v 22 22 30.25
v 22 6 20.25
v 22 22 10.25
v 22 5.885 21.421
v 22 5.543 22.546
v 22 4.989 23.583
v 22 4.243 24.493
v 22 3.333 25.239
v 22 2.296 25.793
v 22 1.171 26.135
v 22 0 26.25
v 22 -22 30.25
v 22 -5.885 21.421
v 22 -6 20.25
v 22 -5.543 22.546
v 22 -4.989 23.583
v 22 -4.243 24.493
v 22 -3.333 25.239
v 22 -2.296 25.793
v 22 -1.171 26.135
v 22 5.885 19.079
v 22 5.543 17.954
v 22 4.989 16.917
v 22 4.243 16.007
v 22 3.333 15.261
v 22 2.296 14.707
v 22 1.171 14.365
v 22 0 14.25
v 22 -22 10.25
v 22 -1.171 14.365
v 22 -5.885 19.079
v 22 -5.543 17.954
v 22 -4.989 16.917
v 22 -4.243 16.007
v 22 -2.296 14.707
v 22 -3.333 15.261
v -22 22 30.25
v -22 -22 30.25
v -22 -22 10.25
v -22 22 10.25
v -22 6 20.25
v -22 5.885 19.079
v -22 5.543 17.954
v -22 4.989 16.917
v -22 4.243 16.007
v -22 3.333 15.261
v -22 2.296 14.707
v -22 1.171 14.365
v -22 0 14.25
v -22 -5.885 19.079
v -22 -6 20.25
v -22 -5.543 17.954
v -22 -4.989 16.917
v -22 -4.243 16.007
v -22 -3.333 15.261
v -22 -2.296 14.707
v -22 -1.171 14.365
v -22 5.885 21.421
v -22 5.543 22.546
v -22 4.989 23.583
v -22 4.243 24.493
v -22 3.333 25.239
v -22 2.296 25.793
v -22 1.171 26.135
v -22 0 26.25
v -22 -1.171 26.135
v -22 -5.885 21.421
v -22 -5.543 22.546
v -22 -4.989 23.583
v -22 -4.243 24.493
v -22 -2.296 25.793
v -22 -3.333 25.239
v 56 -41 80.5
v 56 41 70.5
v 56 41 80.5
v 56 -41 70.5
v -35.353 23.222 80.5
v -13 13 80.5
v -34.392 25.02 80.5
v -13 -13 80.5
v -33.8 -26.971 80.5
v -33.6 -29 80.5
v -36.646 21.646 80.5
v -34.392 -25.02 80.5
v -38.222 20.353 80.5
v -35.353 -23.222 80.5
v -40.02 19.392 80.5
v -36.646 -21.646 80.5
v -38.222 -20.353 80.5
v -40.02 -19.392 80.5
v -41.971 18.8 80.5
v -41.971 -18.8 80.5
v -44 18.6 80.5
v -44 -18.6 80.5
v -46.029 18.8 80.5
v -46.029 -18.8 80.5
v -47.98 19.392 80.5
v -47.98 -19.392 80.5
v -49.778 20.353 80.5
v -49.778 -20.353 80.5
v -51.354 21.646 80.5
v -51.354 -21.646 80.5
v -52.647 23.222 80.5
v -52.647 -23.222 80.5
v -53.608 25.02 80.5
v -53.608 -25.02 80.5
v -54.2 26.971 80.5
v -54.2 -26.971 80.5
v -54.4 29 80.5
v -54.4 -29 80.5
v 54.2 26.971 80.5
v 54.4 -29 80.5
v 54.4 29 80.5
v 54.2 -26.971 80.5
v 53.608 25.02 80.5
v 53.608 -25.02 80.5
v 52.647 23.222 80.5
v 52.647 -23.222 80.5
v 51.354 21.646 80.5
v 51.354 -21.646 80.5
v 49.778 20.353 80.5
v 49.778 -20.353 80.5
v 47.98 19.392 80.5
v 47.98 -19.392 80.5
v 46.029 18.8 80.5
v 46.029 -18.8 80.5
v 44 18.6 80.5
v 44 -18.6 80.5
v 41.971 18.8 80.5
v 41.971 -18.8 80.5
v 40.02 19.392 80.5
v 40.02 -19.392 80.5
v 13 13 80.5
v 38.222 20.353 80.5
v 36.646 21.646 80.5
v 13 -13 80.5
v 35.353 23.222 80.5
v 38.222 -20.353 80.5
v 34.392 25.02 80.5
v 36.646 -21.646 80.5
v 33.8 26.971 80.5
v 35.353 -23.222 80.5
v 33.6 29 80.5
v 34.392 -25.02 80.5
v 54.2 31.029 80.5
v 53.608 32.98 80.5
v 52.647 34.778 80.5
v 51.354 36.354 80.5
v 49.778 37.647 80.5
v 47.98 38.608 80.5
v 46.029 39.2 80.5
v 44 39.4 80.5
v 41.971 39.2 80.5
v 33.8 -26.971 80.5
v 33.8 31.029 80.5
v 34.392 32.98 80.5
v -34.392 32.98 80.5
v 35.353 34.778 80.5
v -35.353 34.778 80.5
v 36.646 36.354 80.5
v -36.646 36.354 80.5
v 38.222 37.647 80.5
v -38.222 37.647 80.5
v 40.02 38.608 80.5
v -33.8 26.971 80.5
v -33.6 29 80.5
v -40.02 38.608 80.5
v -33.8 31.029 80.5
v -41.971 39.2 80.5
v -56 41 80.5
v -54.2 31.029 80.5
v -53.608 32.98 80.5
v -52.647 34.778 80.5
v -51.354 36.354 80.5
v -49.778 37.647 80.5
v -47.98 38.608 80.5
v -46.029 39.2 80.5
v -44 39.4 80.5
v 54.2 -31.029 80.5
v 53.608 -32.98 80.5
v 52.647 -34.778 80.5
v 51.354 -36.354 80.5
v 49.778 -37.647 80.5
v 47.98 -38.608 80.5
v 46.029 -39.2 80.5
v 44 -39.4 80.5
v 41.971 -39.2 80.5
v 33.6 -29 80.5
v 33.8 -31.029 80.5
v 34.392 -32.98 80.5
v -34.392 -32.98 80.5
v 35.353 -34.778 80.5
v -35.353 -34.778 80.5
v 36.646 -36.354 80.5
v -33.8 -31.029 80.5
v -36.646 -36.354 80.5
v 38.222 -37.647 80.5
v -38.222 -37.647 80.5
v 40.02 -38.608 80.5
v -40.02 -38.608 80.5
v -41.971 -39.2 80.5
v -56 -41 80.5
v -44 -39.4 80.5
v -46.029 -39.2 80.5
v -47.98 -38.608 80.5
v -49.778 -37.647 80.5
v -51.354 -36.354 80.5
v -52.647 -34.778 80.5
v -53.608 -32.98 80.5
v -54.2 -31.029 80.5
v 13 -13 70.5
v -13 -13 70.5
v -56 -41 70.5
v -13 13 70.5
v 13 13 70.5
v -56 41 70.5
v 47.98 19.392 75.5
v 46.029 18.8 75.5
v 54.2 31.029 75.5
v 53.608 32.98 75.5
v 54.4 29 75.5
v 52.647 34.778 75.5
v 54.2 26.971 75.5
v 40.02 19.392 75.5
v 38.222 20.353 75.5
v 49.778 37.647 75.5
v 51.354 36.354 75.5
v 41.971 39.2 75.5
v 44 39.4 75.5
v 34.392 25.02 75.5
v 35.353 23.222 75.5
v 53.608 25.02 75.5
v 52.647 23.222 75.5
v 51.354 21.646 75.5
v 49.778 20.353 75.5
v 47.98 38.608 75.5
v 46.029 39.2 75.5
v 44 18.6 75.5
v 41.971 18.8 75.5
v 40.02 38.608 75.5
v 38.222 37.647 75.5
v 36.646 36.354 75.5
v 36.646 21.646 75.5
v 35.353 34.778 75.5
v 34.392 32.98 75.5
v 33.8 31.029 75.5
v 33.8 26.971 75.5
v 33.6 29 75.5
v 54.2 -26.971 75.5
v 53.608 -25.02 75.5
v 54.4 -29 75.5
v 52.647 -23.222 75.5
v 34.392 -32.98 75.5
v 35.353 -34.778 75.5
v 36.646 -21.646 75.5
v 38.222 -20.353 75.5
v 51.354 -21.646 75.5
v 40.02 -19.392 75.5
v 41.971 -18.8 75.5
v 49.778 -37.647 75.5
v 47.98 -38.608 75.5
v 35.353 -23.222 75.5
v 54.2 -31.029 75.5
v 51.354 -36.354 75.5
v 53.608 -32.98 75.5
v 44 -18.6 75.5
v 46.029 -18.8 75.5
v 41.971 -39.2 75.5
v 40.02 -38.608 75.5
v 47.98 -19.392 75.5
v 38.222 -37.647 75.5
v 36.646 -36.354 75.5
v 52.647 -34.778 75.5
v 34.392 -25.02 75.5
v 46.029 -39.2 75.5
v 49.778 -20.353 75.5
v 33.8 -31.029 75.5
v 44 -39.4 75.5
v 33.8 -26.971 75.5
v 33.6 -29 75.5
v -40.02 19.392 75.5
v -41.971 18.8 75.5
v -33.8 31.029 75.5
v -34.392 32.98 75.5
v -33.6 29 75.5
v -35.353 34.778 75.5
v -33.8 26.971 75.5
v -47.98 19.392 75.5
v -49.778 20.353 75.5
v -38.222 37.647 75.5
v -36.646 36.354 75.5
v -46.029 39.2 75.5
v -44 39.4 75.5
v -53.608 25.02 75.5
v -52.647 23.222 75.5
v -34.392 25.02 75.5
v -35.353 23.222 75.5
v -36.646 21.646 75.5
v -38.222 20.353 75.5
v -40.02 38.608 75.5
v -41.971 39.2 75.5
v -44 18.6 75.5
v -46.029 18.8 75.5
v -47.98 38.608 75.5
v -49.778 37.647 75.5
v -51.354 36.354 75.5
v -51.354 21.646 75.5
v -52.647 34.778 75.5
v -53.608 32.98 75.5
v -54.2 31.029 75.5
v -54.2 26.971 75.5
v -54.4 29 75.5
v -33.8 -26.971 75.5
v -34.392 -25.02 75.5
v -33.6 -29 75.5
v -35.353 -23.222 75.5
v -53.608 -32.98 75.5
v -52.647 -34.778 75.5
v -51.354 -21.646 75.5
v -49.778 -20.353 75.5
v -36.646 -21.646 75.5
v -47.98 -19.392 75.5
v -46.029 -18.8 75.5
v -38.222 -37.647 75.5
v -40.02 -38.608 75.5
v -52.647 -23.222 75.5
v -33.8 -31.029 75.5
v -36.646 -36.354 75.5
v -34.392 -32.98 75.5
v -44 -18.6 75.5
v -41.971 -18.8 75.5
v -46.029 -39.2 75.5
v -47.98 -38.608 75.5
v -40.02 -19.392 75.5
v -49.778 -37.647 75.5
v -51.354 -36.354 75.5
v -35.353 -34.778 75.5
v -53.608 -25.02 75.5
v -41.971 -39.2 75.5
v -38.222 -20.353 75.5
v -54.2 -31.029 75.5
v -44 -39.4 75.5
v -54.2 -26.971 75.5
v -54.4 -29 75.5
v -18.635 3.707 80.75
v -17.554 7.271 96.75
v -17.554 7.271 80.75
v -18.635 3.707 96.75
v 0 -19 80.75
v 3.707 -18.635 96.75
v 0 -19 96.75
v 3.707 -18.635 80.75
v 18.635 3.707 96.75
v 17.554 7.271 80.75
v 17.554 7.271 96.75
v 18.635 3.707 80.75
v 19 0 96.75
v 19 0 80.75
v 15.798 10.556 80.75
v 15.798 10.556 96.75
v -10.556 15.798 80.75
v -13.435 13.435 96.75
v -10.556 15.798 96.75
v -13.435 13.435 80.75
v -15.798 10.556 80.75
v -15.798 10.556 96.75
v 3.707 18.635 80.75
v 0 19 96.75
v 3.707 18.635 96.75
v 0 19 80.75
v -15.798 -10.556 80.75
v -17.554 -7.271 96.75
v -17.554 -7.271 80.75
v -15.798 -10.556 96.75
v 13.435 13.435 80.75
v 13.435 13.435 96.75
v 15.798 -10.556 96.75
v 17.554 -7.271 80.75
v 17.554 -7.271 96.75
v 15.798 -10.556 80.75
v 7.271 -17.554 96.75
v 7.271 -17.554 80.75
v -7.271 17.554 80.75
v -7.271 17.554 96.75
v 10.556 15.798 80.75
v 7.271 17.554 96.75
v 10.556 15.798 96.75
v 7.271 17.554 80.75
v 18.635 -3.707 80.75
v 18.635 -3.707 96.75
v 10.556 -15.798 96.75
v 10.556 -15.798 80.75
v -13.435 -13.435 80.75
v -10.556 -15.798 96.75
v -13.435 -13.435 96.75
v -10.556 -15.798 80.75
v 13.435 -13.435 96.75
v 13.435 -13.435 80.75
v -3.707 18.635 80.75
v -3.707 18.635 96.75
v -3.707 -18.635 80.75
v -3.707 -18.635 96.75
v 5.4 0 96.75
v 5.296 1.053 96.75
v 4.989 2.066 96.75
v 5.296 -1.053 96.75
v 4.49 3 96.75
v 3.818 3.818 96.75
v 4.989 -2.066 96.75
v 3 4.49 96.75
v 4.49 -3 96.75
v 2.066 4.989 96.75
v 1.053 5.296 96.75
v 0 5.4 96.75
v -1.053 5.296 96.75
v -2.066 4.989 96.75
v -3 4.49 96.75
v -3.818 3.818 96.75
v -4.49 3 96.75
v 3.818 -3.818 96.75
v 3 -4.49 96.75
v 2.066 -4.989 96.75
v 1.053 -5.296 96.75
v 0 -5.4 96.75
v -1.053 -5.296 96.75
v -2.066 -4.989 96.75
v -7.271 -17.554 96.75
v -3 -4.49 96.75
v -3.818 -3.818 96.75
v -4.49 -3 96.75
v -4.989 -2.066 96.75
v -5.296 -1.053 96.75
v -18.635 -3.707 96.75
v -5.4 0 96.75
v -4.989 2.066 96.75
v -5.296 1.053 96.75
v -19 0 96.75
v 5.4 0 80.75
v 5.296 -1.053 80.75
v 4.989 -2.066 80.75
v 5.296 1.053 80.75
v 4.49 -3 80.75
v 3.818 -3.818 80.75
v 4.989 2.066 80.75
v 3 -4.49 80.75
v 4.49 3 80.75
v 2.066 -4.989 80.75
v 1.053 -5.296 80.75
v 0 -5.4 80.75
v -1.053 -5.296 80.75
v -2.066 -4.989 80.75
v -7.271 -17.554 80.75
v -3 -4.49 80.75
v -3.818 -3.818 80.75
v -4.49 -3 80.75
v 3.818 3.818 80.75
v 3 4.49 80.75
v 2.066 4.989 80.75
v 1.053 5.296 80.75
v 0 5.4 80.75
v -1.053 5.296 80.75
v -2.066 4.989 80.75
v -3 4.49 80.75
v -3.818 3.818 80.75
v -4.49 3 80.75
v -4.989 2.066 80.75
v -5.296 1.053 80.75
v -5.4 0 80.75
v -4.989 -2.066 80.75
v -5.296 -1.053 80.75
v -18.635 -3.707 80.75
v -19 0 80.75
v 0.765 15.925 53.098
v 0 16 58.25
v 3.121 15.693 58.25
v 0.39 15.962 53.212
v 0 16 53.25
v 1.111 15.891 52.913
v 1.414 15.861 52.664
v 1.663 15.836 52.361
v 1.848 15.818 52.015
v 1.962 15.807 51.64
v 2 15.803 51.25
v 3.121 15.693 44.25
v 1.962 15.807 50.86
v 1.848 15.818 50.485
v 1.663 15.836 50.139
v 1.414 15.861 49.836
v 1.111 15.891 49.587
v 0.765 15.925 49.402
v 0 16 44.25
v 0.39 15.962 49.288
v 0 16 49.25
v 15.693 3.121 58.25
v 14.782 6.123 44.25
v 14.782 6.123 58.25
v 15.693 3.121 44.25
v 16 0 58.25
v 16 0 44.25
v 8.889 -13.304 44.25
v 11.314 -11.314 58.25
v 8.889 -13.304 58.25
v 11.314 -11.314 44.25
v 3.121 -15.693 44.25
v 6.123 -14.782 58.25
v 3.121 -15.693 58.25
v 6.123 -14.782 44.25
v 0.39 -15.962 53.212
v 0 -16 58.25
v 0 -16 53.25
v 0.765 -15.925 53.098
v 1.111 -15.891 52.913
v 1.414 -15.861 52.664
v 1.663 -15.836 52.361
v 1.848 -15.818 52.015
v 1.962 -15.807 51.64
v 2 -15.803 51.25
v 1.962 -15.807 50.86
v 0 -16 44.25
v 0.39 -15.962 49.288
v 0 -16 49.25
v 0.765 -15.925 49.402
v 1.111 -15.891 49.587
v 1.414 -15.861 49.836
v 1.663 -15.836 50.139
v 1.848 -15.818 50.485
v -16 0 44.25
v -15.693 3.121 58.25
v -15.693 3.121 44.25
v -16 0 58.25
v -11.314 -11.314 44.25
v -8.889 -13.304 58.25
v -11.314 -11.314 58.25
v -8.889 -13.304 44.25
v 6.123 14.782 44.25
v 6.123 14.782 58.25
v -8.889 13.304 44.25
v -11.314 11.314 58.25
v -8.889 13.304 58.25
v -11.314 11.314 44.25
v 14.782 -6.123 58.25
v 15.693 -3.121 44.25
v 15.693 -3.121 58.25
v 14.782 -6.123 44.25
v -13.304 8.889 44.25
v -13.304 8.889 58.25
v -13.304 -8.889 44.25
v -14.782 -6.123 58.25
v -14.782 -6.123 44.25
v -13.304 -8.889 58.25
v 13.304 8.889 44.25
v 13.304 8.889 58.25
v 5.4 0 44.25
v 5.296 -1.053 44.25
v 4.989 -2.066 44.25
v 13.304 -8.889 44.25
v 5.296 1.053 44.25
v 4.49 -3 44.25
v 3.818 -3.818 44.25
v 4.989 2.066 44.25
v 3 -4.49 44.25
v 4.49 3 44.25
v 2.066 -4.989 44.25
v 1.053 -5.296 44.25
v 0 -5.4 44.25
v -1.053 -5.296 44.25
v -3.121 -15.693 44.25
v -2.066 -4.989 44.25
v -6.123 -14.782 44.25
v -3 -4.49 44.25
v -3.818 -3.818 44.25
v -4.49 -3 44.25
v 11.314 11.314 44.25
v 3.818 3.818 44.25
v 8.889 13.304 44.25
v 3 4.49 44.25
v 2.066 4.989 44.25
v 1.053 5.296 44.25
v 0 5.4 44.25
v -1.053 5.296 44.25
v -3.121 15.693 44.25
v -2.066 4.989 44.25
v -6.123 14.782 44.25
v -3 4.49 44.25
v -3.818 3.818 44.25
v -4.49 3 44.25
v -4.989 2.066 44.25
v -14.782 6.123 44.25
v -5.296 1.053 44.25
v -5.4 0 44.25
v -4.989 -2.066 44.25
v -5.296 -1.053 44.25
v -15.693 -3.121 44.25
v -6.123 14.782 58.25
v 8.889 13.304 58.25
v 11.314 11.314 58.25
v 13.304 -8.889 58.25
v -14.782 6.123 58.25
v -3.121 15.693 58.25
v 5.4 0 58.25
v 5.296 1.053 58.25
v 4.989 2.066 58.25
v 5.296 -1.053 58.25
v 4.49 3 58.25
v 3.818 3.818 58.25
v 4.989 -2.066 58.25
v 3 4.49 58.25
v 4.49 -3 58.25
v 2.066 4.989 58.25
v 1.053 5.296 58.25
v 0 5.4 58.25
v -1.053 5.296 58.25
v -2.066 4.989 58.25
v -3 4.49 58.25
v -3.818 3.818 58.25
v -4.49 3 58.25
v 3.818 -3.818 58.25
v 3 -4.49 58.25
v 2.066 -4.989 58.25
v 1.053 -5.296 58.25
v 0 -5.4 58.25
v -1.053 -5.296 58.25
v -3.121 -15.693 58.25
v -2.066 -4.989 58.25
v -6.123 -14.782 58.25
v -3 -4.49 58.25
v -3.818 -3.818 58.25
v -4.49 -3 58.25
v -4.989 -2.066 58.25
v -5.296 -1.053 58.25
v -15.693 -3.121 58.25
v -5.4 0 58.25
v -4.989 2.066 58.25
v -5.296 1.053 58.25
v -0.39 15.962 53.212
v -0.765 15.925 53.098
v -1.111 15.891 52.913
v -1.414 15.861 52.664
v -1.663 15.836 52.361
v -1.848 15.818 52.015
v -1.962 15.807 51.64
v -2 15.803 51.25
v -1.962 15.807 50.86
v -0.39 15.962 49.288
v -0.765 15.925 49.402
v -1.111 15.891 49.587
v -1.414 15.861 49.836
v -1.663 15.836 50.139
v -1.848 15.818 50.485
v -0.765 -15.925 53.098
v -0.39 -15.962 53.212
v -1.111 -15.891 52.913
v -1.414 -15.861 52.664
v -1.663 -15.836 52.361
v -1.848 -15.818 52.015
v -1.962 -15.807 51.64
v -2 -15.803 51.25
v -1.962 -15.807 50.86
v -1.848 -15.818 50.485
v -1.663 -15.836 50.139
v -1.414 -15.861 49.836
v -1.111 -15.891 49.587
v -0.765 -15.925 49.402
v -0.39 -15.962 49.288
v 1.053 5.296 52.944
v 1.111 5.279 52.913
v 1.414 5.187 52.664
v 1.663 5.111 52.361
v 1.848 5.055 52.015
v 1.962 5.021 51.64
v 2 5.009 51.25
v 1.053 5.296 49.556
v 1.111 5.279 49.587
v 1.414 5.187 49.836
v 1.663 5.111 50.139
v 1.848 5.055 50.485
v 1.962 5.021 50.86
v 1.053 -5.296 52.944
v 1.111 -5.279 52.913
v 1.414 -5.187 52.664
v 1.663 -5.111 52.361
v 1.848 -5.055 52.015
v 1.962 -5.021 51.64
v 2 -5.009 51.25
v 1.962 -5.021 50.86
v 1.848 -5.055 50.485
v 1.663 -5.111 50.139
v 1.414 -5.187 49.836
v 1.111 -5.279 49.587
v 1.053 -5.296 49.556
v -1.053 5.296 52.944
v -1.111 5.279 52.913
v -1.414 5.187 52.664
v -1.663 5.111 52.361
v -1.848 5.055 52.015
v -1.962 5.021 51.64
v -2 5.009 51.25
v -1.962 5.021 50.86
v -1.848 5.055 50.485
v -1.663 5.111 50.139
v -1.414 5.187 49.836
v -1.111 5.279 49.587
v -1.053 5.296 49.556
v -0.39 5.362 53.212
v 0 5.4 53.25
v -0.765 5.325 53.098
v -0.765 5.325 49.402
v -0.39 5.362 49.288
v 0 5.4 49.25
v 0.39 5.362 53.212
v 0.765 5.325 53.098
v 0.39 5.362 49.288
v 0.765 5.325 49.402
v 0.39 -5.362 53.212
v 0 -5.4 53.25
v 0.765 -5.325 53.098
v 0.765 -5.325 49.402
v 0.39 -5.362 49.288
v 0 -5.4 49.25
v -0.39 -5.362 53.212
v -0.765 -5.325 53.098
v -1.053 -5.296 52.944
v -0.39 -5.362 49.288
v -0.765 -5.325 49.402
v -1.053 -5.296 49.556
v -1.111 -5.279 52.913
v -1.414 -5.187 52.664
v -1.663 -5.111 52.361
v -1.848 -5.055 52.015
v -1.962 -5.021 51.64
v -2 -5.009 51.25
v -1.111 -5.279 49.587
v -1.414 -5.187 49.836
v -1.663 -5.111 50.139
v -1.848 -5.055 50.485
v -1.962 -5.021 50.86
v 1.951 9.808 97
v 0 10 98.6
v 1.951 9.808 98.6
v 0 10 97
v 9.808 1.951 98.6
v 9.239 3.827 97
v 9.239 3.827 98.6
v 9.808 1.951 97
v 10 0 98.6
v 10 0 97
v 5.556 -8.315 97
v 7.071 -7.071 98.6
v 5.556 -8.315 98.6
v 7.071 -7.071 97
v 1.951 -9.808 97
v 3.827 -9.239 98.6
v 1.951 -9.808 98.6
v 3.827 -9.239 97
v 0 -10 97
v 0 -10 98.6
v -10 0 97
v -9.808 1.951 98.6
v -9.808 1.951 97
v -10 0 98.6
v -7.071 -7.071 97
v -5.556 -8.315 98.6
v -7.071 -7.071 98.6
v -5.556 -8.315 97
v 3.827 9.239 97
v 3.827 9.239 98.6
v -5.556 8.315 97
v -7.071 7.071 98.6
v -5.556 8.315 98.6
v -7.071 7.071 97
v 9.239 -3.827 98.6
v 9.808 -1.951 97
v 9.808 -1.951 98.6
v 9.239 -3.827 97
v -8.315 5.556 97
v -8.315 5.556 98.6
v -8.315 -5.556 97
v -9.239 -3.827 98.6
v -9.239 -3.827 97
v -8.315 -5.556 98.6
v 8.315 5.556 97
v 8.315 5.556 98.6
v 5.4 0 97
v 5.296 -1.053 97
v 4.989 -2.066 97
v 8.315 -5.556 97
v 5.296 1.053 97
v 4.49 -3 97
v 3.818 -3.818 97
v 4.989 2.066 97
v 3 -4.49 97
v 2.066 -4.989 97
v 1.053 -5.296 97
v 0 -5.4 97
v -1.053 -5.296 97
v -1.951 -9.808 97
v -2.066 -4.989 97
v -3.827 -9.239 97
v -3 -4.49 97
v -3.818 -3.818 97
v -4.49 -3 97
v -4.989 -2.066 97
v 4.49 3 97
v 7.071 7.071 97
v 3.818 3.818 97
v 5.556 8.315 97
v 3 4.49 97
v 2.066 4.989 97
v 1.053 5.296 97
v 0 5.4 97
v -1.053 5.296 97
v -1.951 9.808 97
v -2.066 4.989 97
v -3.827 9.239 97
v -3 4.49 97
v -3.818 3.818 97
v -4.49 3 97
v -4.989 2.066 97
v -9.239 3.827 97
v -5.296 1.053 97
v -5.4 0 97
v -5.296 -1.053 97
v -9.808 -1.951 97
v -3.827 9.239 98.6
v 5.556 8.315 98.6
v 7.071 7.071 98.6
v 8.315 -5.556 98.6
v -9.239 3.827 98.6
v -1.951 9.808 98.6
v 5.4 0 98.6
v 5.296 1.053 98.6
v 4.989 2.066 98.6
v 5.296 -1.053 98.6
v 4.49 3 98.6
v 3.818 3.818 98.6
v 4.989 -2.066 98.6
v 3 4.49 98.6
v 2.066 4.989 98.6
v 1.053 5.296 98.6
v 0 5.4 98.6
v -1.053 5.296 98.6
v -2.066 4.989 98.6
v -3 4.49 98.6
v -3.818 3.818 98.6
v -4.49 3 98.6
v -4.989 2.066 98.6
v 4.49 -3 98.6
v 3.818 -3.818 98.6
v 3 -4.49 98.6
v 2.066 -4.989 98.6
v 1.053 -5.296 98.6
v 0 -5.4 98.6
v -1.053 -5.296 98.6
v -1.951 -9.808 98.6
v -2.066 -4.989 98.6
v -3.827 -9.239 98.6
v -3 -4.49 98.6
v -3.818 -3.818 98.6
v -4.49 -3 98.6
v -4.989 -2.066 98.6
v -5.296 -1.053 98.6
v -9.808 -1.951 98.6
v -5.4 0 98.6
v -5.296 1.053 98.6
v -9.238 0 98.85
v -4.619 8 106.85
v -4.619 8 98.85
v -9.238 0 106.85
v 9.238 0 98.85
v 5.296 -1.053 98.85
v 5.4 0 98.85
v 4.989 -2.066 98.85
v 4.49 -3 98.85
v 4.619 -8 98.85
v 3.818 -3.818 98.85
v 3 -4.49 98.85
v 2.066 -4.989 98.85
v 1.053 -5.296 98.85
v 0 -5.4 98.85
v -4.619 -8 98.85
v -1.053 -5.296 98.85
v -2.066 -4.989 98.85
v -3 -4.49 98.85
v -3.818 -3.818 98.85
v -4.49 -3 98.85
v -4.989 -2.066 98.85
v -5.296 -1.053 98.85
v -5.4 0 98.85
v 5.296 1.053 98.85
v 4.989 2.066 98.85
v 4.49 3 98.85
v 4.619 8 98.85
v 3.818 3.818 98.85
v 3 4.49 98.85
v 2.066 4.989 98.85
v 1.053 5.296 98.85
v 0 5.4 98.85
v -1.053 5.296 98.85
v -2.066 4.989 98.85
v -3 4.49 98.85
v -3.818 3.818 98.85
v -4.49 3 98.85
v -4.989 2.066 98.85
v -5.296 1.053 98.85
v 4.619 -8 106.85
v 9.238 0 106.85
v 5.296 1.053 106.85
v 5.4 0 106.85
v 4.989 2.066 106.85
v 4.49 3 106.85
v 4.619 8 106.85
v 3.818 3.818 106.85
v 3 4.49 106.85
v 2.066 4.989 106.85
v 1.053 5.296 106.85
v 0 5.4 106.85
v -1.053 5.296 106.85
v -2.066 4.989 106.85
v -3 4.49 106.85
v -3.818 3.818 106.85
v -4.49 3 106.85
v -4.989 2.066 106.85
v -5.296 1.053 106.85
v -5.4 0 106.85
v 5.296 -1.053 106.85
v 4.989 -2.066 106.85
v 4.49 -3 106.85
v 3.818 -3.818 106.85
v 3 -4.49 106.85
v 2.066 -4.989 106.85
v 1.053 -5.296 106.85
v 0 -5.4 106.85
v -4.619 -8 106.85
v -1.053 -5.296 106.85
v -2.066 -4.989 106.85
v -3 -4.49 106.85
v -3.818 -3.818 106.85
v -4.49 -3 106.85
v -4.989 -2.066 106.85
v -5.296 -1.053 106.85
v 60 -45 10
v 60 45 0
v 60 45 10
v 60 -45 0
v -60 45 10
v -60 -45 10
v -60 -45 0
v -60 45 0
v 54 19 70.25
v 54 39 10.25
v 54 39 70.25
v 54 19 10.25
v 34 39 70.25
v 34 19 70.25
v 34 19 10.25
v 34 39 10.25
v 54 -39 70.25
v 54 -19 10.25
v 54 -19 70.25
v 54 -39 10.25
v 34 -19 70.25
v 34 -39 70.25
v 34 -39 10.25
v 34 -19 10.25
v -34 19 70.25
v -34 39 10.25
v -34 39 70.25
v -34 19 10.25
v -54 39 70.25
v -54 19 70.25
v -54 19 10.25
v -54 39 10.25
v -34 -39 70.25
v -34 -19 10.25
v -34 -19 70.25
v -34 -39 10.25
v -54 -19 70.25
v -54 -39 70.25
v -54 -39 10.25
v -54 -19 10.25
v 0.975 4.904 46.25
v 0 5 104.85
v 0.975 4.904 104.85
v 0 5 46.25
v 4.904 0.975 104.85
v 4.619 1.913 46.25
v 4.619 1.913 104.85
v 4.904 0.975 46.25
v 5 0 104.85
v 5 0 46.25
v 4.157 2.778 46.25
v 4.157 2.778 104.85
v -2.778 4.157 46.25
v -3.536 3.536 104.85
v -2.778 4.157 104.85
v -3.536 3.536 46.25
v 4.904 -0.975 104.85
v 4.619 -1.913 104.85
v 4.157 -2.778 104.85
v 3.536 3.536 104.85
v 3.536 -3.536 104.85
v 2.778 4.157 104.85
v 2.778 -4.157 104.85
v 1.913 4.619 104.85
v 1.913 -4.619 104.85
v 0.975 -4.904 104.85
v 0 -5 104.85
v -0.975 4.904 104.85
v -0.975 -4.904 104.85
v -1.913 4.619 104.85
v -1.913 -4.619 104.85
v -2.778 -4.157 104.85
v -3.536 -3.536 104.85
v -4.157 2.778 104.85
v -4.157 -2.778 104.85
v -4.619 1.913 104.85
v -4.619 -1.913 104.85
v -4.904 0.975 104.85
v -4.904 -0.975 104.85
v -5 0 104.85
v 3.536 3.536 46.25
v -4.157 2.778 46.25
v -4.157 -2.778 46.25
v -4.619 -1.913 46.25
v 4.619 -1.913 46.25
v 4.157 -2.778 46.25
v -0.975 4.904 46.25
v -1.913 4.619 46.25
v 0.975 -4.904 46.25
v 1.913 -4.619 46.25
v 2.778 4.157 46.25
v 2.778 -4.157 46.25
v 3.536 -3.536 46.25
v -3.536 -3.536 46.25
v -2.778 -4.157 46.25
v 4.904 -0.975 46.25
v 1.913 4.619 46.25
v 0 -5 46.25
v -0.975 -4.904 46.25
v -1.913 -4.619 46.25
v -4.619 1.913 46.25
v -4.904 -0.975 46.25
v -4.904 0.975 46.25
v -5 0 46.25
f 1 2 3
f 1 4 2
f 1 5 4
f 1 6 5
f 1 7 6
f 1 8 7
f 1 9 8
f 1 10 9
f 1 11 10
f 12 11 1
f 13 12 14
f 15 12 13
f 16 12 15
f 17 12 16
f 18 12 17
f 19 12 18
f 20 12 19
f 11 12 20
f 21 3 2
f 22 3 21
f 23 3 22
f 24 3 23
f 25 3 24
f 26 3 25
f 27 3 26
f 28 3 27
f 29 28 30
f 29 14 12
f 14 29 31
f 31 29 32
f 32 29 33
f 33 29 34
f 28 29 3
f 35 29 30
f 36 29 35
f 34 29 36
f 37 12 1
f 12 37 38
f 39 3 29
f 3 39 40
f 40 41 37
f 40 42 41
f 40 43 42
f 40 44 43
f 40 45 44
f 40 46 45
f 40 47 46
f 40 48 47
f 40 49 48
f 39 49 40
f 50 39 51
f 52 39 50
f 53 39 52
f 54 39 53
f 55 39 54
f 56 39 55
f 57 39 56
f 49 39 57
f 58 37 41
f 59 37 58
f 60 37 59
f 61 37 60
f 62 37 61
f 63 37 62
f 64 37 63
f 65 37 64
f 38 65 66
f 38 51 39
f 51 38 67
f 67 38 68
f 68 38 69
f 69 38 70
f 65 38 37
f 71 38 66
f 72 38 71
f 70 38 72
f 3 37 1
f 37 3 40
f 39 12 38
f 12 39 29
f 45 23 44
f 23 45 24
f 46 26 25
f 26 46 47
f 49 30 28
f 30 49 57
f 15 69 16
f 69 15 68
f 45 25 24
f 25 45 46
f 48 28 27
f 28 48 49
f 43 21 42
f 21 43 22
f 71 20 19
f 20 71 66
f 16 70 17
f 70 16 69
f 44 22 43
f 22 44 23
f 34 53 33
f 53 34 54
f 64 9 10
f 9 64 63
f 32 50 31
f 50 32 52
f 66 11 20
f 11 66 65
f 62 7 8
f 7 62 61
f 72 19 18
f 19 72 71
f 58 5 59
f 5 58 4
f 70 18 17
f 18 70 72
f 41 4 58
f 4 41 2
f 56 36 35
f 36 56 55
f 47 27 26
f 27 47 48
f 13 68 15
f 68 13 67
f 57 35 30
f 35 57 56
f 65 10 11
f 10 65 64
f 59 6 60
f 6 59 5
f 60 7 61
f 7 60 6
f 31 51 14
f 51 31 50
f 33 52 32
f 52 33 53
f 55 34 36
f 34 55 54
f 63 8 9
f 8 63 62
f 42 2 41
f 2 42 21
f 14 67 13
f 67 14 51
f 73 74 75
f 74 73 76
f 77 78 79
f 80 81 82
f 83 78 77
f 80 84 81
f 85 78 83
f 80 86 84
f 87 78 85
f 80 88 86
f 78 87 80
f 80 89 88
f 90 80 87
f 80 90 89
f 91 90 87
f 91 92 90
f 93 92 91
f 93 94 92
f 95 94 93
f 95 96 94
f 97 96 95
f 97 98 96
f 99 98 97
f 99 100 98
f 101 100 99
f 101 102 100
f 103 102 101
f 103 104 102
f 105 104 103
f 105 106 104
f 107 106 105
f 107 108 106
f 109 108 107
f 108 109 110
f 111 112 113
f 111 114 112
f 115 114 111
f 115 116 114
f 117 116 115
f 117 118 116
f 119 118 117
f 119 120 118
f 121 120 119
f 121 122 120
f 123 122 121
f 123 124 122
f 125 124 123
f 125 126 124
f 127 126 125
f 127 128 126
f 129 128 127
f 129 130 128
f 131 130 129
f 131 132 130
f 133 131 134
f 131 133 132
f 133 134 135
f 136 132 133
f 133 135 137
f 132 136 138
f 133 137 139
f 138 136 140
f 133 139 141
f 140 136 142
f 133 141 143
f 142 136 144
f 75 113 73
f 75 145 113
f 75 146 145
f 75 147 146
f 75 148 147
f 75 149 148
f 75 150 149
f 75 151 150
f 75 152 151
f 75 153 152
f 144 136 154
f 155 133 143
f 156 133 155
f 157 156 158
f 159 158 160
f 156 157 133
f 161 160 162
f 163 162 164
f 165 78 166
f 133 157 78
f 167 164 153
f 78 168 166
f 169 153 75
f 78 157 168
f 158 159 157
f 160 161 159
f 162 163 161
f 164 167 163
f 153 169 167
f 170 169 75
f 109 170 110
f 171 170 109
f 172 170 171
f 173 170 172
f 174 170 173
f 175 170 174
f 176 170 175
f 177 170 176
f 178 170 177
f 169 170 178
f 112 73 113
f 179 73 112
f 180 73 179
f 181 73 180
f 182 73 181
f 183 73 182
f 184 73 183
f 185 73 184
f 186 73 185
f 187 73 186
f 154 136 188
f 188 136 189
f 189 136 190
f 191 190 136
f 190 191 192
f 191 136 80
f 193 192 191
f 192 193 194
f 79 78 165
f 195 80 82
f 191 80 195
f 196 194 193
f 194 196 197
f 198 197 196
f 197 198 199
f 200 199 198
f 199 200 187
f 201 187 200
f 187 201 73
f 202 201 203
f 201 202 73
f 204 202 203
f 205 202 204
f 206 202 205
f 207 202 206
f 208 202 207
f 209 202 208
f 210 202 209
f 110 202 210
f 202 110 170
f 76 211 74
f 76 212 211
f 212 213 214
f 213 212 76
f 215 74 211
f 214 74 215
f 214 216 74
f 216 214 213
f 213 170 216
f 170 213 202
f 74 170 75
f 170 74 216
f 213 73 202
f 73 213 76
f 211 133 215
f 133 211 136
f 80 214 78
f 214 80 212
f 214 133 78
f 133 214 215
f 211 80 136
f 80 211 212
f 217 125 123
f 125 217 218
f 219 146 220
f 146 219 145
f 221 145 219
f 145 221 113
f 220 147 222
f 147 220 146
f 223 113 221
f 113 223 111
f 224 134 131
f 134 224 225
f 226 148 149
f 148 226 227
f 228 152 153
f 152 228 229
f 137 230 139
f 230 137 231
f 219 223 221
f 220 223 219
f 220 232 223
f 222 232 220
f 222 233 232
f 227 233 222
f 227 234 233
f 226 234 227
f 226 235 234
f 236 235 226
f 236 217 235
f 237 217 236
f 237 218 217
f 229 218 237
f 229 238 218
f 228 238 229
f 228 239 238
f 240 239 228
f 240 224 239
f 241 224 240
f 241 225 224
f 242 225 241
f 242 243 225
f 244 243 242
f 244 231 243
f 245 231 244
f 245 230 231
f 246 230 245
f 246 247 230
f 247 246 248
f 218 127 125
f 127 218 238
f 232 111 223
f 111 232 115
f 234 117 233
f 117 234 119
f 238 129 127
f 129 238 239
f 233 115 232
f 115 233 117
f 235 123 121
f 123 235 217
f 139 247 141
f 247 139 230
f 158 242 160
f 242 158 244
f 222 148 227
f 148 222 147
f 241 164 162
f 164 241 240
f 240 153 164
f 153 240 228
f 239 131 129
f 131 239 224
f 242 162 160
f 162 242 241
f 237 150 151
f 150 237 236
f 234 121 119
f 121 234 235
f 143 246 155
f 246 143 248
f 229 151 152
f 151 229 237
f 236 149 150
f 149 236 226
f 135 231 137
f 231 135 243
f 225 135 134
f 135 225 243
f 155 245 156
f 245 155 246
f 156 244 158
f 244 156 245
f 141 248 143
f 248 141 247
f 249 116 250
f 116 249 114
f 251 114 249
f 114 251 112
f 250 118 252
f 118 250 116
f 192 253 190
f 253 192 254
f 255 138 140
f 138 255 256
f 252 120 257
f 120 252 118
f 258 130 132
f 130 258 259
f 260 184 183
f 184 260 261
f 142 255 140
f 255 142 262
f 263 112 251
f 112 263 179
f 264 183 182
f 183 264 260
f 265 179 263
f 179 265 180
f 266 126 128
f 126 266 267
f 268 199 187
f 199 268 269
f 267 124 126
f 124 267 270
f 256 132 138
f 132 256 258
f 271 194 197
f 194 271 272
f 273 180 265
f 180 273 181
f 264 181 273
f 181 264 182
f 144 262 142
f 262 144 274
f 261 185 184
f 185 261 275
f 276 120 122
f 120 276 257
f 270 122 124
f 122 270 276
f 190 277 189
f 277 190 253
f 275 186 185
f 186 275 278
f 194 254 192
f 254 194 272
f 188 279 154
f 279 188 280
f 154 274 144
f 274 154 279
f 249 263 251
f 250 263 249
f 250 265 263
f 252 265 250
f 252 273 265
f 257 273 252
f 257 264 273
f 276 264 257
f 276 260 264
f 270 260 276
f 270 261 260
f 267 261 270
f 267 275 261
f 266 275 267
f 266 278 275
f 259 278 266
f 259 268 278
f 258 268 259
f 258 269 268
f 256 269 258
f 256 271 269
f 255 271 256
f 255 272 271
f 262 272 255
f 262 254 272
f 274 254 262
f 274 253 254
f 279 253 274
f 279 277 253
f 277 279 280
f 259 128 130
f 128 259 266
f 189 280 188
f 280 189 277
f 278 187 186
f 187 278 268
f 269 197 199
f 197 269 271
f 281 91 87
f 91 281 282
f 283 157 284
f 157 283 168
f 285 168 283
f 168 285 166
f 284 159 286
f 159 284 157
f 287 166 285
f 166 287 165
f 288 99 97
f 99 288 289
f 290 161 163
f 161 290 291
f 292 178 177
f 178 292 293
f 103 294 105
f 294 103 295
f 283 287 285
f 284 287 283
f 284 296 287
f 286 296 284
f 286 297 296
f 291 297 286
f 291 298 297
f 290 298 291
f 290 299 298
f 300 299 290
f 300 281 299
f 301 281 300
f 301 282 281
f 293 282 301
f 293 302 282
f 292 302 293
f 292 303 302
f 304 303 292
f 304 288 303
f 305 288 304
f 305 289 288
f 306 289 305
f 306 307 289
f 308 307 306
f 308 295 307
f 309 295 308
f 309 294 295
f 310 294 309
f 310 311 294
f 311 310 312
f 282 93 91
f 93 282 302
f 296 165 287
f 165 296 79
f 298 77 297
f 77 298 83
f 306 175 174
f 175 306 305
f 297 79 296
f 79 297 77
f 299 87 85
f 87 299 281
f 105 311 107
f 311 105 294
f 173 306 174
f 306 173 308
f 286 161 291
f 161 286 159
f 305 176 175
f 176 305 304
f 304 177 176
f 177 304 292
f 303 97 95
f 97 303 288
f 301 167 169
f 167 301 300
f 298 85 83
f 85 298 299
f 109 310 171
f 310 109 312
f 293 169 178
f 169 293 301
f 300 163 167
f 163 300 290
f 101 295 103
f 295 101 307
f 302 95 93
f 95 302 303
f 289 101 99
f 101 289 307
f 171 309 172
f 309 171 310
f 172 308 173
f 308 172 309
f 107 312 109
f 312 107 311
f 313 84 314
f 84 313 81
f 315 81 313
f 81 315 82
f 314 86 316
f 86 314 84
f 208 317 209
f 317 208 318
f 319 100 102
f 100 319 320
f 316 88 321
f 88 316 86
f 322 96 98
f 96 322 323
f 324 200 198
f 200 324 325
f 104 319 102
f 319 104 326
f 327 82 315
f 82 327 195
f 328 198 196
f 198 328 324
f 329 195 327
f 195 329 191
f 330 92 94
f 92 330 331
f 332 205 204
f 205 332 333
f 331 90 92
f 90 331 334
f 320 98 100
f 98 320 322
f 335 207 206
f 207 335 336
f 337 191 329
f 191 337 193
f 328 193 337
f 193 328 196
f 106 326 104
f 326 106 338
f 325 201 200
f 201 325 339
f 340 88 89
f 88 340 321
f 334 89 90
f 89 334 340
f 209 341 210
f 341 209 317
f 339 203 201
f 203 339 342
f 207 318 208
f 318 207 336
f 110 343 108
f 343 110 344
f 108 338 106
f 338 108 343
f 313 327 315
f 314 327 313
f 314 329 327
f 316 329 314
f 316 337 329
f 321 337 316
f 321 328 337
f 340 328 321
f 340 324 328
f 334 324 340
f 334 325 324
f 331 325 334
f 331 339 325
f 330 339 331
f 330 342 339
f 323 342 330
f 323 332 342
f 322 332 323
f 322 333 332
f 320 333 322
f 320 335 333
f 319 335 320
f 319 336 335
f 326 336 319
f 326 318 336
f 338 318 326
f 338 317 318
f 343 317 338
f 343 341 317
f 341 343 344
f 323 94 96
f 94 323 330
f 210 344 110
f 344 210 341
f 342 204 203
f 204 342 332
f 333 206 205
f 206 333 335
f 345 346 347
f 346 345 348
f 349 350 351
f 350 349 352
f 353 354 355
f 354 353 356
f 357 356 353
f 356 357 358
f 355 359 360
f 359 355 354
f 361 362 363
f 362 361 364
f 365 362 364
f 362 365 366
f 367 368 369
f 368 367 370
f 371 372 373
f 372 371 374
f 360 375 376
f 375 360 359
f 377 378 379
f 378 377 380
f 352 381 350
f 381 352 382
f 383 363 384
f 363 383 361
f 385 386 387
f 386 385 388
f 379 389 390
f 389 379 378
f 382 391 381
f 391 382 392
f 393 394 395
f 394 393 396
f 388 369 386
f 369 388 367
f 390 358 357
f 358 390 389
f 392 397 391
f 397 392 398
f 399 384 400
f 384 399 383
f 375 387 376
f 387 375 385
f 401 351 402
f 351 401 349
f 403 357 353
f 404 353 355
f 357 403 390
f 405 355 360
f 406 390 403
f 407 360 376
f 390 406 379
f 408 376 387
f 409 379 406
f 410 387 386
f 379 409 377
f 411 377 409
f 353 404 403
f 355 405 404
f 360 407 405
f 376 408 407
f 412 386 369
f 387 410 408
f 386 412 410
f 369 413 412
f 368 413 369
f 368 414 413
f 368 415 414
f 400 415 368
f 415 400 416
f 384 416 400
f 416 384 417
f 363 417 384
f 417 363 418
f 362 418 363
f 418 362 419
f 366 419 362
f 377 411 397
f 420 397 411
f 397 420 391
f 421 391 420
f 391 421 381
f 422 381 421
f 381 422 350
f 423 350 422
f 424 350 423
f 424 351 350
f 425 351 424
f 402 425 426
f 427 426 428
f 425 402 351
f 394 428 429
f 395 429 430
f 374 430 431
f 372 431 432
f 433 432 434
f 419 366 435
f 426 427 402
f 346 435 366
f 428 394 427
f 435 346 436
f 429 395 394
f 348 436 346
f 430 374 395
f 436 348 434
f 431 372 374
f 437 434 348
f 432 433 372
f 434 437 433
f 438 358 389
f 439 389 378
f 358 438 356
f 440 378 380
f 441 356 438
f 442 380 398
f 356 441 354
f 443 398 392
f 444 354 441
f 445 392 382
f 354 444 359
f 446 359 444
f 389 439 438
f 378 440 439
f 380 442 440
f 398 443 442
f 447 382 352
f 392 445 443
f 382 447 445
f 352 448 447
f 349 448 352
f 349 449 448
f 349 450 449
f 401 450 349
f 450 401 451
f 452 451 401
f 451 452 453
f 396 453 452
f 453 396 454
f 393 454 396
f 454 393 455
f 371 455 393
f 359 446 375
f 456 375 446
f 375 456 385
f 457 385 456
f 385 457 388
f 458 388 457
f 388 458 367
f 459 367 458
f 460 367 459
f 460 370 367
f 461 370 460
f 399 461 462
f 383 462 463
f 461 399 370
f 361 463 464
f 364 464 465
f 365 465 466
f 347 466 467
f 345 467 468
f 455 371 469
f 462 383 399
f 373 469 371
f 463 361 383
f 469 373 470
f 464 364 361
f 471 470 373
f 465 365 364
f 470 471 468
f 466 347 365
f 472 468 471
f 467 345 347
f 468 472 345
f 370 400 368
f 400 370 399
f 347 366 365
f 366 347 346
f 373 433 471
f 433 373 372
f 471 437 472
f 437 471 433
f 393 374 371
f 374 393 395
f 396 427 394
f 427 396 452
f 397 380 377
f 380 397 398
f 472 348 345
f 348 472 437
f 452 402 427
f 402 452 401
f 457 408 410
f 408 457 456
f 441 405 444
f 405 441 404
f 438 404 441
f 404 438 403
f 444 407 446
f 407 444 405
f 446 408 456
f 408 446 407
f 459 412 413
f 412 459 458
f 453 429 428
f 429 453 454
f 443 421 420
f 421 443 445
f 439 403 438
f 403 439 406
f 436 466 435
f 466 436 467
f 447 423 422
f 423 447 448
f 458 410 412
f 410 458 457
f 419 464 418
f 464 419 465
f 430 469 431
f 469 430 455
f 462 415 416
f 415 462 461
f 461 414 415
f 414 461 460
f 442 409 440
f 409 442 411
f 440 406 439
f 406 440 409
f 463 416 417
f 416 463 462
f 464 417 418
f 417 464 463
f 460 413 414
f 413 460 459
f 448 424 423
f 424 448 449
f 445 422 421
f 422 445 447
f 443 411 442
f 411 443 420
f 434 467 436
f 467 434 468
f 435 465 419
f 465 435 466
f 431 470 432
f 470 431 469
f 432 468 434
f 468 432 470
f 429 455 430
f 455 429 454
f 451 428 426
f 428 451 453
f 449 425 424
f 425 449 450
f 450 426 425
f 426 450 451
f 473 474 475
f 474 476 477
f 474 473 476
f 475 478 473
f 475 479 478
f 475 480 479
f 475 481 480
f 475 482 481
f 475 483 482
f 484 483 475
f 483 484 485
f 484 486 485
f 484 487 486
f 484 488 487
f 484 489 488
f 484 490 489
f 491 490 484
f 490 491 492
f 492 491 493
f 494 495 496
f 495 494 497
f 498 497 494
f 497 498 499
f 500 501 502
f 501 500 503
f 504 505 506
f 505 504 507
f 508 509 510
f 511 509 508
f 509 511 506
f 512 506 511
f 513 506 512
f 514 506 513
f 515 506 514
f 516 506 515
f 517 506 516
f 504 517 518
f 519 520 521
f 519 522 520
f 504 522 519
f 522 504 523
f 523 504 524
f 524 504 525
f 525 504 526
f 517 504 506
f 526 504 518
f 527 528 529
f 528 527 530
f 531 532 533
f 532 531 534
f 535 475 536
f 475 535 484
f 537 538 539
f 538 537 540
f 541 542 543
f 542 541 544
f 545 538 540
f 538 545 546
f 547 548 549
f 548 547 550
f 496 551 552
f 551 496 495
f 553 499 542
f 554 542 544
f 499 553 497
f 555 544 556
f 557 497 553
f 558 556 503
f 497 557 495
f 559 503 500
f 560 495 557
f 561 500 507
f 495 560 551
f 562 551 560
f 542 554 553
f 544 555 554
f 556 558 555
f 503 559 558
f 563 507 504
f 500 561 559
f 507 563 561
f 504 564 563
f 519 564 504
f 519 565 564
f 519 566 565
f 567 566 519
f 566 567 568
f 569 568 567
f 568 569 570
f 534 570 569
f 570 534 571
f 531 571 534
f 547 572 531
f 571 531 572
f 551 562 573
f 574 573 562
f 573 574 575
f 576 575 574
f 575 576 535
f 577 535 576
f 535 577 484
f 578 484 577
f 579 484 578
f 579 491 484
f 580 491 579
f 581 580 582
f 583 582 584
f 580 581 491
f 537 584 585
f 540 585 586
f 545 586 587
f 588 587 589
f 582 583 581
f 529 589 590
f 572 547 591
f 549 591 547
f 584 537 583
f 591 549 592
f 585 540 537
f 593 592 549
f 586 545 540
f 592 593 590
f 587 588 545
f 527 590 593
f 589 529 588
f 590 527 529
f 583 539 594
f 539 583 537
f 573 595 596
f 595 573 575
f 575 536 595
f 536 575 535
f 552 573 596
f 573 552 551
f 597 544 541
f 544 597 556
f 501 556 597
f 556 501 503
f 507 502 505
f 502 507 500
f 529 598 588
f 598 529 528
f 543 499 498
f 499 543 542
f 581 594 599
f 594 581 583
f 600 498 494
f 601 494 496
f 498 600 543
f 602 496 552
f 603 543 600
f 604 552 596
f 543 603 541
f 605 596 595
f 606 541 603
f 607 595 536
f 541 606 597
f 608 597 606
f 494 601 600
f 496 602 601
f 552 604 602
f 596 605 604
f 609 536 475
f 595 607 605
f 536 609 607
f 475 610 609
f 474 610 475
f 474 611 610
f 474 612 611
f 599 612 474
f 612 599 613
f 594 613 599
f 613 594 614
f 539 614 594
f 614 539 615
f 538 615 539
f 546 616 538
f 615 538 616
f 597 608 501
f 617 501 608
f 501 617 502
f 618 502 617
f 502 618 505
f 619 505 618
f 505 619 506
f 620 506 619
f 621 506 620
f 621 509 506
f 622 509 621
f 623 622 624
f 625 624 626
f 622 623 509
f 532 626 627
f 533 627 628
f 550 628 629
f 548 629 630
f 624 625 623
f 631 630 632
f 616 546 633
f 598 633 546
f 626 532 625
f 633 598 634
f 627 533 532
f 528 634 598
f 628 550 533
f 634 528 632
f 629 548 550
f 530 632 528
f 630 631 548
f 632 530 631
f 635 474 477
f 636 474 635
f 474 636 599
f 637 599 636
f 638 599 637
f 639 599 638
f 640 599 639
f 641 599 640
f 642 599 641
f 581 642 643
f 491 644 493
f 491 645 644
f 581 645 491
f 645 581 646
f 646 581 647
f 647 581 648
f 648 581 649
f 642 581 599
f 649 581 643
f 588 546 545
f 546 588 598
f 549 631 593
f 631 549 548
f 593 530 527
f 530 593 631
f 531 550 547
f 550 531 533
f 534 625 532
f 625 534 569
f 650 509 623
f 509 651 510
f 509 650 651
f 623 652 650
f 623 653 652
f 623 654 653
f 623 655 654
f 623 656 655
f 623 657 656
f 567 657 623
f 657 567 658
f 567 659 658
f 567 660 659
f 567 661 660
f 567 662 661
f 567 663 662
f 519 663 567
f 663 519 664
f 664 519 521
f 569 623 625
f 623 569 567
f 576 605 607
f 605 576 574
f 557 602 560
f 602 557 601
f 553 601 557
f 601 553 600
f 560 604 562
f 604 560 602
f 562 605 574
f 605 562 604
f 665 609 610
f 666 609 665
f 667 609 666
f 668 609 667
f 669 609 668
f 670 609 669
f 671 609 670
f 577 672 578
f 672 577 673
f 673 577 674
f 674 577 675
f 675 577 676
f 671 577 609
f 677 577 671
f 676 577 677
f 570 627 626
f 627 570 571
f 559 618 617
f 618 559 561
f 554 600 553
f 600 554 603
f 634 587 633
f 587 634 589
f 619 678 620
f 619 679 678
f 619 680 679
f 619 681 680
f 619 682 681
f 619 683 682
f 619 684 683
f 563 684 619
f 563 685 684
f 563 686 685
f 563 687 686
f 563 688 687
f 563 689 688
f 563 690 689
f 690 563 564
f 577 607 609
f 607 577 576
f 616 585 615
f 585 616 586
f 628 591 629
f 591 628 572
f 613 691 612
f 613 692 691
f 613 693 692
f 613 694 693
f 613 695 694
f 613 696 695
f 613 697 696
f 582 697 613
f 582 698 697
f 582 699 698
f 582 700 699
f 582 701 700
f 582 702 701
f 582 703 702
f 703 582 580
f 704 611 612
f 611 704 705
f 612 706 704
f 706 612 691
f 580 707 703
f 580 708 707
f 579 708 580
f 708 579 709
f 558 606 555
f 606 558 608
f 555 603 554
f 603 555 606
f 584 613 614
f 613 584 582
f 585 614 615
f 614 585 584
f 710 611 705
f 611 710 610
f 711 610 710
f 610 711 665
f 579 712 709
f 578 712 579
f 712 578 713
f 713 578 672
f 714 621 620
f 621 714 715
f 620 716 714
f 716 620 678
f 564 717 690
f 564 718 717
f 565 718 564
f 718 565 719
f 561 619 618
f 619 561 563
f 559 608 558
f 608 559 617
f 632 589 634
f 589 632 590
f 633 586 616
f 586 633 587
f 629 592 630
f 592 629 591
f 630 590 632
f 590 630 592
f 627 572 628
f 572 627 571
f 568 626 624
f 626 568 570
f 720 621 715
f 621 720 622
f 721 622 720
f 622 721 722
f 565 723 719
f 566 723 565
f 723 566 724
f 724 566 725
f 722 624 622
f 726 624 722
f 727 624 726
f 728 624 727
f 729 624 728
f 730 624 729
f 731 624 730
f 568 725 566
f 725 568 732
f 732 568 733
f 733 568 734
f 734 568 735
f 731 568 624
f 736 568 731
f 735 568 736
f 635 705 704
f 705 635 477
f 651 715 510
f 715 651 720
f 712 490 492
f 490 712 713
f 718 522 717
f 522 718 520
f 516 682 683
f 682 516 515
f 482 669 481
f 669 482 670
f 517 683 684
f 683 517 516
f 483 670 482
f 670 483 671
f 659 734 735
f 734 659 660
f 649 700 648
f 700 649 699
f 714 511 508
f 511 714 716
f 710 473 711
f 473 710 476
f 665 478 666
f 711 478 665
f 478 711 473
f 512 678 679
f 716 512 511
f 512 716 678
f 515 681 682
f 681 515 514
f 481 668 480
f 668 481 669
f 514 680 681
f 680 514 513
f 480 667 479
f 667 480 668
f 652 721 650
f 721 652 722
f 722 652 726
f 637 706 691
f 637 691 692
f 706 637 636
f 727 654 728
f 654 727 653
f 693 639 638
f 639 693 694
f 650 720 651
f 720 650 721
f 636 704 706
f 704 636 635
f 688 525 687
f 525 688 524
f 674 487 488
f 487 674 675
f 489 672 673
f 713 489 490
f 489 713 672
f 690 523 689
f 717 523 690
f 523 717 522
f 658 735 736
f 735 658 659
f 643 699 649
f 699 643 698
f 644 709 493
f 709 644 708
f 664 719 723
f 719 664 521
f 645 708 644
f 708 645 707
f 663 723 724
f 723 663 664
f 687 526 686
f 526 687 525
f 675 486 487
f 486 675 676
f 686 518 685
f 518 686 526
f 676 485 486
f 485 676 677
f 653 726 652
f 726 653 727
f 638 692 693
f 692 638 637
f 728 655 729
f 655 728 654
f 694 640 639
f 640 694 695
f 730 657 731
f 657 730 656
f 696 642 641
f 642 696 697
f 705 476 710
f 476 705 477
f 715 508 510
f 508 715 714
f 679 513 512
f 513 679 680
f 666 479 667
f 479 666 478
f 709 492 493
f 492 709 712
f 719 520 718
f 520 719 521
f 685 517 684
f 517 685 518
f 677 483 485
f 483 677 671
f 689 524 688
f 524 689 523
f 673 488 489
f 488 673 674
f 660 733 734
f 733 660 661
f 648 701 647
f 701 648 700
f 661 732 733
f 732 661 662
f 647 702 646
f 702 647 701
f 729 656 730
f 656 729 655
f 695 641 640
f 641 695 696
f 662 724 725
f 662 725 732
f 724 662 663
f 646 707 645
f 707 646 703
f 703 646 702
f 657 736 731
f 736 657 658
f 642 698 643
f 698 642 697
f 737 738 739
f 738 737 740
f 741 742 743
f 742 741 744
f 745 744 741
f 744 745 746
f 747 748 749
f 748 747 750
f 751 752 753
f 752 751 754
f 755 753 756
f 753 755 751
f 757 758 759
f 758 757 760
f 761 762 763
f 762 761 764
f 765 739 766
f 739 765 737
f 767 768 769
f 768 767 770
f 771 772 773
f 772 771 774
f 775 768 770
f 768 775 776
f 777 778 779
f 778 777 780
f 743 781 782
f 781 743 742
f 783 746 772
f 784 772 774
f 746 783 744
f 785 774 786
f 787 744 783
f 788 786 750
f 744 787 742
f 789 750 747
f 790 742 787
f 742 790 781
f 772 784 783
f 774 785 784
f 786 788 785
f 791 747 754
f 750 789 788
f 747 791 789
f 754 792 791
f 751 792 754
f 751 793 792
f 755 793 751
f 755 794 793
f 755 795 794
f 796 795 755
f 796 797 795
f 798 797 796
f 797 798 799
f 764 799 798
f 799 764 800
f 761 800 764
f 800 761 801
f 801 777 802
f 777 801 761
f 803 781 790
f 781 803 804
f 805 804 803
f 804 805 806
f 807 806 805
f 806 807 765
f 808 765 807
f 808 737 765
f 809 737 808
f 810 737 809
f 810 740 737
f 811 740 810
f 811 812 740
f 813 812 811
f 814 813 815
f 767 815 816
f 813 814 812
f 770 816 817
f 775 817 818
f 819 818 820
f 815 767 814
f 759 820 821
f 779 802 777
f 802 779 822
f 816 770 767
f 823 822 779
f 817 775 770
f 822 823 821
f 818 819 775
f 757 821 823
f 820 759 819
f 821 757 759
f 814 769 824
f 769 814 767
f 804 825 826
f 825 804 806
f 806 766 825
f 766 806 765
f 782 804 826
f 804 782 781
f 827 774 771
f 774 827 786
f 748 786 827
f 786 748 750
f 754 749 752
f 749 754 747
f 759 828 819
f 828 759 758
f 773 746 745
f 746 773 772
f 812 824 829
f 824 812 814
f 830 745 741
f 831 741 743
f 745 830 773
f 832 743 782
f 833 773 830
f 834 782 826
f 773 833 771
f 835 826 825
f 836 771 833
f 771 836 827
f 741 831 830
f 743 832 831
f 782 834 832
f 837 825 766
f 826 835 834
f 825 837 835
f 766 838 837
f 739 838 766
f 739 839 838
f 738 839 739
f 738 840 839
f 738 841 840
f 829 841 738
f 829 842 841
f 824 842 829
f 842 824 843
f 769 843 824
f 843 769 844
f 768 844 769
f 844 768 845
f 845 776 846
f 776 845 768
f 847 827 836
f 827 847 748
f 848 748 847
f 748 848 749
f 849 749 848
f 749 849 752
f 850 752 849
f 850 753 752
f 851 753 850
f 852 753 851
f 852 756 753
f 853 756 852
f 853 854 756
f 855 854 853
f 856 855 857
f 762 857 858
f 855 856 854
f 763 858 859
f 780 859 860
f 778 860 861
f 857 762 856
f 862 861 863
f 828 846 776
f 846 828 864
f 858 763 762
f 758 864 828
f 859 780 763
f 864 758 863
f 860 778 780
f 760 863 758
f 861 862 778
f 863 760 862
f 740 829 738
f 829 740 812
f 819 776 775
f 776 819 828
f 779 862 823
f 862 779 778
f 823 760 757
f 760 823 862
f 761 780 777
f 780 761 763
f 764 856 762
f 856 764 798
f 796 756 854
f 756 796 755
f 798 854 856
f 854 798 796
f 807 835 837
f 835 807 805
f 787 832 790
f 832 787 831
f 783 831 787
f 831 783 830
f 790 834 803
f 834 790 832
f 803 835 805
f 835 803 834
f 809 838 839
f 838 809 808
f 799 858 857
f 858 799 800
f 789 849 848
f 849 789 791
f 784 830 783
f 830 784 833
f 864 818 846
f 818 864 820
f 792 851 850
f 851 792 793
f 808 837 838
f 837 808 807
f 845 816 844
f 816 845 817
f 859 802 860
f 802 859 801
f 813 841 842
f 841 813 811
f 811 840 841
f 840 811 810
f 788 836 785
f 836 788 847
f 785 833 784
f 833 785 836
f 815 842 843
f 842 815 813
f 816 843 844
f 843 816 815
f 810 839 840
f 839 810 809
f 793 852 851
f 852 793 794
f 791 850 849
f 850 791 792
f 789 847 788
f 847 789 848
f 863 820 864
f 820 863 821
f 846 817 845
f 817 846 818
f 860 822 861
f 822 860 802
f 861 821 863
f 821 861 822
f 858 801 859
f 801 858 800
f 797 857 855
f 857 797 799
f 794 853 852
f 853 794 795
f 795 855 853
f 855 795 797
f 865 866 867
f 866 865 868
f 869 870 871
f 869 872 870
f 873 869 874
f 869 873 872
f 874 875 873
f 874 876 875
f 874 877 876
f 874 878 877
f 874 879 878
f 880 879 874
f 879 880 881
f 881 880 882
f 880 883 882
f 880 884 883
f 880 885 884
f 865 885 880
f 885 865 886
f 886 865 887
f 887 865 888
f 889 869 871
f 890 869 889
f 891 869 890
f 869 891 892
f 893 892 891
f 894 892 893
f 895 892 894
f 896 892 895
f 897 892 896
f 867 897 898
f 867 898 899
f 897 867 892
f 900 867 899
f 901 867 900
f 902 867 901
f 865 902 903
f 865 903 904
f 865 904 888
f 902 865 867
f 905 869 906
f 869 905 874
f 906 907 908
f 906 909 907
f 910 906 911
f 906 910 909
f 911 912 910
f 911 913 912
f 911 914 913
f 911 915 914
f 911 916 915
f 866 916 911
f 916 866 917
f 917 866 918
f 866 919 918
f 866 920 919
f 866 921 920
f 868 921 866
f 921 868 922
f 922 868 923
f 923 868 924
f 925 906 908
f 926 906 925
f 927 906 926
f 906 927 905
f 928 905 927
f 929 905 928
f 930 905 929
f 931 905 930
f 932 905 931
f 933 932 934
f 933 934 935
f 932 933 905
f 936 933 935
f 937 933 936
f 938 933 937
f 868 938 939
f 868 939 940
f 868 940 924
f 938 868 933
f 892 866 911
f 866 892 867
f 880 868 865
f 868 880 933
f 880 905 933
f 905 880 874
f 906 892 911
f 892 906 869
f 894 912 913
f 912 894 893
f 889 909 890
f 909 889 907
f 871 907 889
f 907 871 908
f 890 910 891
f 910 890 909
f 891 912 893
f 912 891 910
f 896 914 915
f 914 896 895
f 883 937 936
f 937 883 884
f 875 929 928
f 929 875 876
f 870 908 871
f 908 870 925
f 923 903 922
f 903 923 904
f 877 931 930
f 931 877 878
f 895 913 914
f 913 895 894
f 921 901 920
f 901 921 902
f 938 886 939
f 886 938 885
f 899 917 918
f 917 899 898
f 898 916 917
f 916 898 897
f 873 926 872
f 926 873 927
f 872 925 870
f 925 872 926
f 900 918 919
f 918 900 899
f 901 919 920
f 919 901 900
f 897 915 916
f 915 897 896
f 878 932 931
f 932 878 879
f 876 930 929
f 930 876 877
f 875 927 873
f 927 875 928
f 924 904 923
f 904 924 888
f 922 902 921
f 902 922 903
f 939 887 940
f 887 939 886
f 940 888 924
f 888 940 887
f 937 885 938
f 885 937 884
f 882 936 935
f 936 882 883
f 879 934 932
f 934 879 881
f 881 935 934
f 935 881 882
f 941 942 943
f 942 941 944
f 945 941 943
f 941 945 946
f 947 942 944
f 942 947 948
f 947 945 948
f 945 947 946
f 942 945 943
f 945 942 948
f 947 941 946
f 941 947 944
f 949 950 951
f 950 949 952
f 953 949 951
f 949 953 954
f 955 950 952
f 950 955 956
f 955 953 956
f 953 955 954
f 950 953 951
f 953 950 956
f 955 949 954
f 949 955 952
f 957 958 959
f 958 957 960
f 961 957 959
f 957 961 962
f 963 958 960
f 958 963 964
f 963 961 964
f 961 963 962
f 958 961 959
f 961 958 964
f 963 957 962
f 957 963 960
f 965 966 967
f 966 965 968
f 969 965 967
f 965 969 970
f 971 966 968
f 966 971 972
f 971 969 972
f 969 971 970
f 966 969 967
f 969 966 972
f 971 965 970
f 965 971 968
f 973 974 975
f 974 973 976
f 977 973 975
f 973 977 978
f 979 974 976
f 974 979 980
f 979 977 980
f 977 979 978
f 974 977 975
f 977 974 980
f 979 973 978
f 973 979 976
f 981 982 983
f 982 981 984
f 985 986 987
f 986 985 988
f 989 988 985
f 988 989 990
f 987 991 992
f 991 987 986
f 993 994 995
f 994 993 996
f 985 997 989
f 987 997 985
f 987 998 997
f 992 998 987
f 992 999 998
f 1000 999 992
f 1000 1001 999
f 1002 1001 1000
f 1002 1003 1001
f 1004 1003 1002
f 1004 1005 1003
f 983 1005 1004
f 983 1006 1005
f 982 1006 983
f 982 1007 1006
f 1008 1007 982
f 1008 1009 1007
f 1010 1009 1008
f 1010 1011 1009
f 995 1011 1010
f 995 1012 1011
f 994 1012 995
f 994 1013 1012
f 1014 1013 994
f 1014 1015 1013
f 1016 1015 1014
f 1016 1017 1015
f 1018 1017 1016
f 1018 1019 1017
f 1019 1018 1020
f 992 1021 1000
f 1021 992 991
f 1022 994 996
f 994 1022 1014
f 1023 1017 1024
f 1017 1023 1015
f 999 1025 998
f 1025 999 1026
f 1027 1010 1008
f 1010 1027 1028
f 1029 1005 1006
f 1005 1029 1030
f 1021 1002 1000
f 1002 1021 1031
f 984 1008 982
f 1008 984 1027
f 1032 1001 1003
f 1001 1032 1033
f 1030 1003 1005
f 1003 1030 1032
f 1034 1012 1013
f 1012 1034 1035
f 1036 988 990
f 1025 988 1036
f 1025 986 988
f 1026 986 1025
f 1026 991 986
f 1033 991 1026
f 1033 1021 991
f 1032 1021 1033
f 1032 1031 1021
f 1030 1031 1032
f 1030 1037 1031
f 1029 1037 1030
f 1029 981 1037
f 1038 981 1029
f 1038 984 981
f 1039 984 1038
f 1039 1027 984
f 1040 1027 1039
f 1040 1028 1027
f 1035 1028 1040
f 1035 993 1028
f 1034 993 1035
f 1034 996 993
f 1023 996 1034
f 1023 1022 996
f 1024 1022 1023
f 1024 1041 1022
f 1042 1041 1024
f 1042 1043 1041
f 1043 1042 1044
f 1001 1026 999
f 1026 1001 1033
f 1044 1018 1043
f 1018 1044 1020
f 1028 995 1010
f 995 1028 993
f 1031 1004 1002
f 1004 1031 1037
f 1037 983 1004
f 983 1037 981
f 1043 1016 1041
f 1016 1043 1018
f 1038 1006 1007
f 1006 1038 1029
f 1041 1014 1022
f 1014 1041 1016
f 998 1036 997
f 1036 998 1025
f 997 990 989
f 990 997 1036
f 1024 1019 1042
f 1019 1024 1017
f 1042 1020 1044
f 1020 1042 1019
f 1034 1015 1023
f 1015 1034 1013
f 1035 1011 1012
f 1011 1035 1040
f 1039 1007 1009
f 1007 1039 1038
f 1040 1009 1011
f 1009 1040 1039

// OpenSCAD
$fn = 32;

// ------------------------------------------------------------------------
// Arbor press fixture: screw d10, posts 60 mm, gap 14 mm
// Every part is its own module, assembly() places every instance.
// ------------------------------------------------------------------------

// --- part 1 ---
module press_bed() {
  difference() {
    translate([-60, -45, 0]) cube([120, 90, 10]);
  }
}

// --- part 2 ---
module anvil_block() {
  difference() {
    translate([-22, -22, 0]) cube([44, 44, 20]);
    translate([0, 0, 10]) rotate([0, 90, 0]) cylinder(h = 46, d = 12, center = true);
  }
}

// --- part 3 ---
module press_post_a() {
  translate([-10, -10, 0]) cube([20, 20, 60]);
}

// --- part 4 ---
module press_post_b() {
  translate([-10, -10, 0]) cube([20, 20, 60]);
}

// --- part 5 ---
module press_post_c() {
  translate([-10, -10, 0]) cube([20, 20, 60]);
}

// --- part 6 ---
module press_post_d() {
  translate([-10, -10, 0]) cube([20, 20, 60]);
}

// --- part 7 ---
module press_frame() {
  difference() {
    translate([-56, -41, 0]) cube([112, 82, 10]);
    translate([-13, -13, -1]) cube([26, 26, 12]);
    translate([44, 29, 5]) cylinder(h = 6, d = 20.8);
    translate([44, -29, 5]) cylinder(h = 6, d = 20.8);
    translate([-44, 29, 5]) cylinder(h = 6, d = 20.8);
    translate([-44, -29, 5]) cylinder(h = 6, d = 20.8);
  }
}

// --- part 8 ---
module guide_ring() {
  difference() {
      translate([0, 0, 0]) cylinder(h = 16, d = 38);
      translate([0, 0, -1]) cylinder(h = 18, d = 10.8);
    }
}

// --- part 9 ---
module press_screw() {
  translate([0, 0, -29.3]) cylinder(h = 58.6, d = 10);
}

// --- part 10 ---
module press_head() {
  difference() {
    cylinder(h = 14, d = 32);
    translate([0, 0, -1]) cylinder(h = 16, d = 10.8);
    translate([0, 0, 7]) rotate([90, 0, 0]) cylinder(h = 34, d = 4, center = true);
  }
}

// --- part 11 ---
module nut_washer() {
  difference() {
      translate([0, 0, 0]) cylinder(h = 1.6, d = 20);
      translate([0, 0, -1]) cylinder(h = 3.6, d = 10.8);
    }
}

// --- part 12 ---
module press_nut() {
  difference() {
    linear_extrude(height = 8) polygon(points = [[9.238, 0], [4.619, 8], [-4.619, 8], [-9.238, 0], [-4.619, -8], [4.619, -8]]);
    translate([0, 0, -1]) cylinder(h = 10, d = 10.8);
  }
}

// --- assembly ---
module assembly() {
  color([0.80, 0.24, 0.20]) translate([0, 0, 0]) rotate([0, 0, 0]) press_bed();
  color([0.20, 0.45, 0.75]) translate([0, 0, 10.25]) rotate([0, 0, 0]) anvil_block();
  color([0.25, 0.62, 0.32]) translate([44, 29, 10.25]) rotate([0, 0, 0]) press_post_a();
  color([0.92, 0.70, 0.18]) translate([44, -29, 10.25]) rotate([0, 0, 0]) press_post_b();
  color([0.58, 0.35, 0.70]) translate([-44, 29, 10.25]) rotate([0, 0, 0]) press_post_c();
  color([0.16, 0.66, 0.66]) translate([-44, -29, 10.25]) rotate([0, 0, 0]) press_post_d();
  color([0.85, 0.48, 0.18]) translate([0, 0, 70.5]) rotate([0, 0, 0]) press_frame();
  color([0.55, 0.60, 0.65]) translate([0, 0, 80.75]) rotate([0, 0, 0]) guide_ring();
  color([0.75, 0.30, 0.55]) translate([0, 0, 75.55]) rotate([0, 0, 0]) press_screw();
  color([0.42, 0.52, 0.28]) translate([0, 0, 44.25]) rotate([0, 0, 0]) press_head();
  color([0.80, 0.24, 0.20]) translate([0, 0, 97]) rotate([0, 0, 0]) nut_washer();
  color([0.20, 0.45, 0.75]) translate([0, 0, 98.85]) rotate([0, 0, 0]) press_nut();
}

assembly();
